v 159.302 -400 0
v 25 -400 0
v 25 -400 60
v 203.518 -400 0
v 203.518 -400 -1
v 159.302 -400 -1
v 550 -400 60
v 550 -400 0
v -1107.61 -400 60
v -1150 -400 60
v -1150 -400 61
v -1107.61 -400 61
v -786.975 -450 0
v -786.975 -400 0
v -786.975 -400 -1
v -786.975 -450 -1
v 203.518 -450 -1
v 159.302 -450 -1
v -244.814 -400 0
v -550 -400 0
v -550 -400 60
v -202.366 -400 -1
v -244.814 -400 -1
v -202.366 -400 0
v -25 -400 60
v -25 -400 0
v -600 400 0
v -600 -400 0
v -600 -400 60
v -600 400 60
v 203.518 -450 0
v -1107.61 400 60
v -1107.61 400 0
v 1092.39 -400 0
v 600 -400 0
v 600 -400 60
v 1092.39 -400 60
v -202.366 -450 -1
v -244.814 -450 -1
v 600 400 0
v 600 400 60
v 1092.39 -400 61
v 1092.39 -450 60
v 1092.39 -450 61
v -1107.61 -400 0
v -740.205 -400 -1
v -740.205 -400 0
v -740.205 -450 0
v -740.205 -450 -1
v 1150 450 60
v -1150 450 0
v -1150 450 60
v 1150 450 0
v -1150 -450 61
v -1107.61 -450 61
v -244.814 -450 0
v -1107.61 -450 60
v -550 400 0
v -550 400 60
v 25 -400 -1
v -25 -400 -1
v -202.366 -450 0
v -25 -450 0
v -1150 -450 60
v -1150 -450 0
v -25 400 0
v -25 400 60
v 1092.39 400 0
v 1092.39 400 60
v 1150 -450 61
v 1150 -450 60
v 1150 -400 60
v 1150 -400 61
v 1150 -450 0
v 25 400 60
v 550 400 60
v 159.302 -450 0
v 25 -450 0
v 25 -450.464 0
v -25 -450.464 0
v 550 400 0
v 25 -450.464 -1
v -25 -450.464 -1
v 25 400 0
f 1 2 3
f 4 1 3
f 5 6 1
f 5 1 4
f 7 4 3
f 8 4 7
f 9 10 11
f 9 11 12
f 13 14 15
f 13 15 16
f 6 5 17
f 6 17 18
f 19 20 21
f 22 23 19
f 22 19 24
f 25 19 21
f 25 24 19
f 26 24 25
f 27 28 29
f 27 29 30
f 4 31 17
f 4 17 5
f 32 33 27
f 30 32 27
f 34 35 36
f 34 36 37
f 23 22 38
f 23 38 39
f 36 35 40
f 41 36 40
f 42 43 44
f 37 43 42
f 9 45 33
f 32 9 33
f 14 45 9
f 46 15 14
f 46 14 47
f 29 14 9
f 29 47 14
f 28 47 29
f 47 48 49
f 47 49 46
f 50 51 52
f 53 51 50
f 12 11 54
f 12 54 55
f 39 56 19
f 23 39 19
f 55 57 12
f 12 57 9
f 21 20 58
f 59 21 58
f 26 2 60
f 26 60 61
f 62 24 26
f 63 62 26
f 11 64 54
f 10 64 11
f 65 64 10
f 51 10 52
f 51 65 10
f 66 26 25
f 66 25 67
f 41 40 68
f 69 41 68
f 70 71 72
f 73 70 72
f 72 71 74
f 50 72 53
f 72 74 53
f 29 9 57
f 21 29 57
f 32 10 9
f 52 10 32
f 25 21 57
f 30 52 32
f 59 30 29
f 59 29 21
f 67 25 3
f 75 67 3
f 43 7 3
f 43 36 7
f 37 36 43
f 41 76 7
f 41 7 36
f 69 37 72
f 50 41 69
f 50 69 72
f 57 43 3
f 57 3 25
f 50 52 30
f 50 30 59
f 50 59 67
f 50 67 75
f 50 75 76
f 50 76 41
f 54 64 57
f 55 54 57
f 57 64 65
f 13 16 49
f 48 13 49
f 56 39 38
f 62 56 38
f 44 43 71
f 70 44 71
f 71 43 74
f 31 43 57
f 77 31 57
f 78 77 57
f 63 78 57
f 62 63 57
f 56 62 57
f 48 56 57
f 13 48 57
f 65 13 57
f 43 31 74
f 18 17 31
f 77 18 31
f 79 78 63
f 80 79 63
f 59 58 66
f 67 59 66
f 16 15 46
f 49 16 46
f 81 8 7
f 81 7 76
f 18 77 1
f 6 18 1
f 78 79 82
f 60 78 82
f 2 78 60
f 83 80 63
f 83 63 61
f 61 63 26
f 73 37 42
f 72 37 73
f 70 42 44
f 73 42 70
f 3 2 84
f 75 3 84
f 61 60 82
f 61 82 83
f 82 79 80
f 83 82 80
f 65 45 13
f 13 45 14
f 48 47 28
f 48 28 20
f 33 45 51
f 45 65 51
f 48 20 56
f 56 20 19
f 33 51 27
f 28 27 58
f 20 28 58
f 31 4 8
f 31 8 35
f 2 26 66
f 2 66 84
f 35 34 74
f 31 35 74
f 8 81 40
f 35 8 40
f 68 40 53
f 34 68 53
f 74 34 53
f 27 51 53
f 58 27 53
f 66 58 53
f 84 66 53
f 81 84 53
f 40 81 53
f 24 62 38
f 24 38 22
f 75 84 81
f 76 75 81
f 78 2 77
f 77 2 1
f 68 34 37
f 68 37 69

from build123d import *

# Parameters (mm, degrees)
SKETCH1_W           = 2300
SKETCH1_H           = 900
SKETCH1_W_2         = 525
SKETCH1_H_2         = 800
SKETCH1_W_3         = 492.389580631
SKETCH1_W_4         = 507.610419369
BOSS_EXTRUDE1_DEPTH = 60
SKETCH2_W           = 42.389580631
SKETCH2_H           = 50
SKETCH2_W_2         = 57.610419369
BOSS_EXTRUDE2_DEPTH = 1
SKETCH4_W           = 50
SKETCH4_H           = 50.463593603
BOSS_EXTRUDE4_DEPTH = 1
SKETCH5_W           = 44.216514846
SKETCH5_H           = 50
BOSS_EXTRUDE5_DEPTH = 1
SKETCH6_W           = 42.447812038
SKETCH6_H           = 50
BOSS_EXTRUDE6_DEPTH = 1
BOSS_EXTRUDE7_DEPTH = 1


with BuildPart() as part:
    # Sketch1 → Boss-Extrude1 (new body)
    with BuildSketch(Plane.XY):
        Rectangle(SKETCH1_W, SKETCH1_H)
        with Locations((-287.5, 0)):
            Rectangle(SKETCH1_W_2, SKETCH1_H_2, mode=Mode.SUBTRACT)
        with Locations((287.5, 0)):
            Rectangle(SKETCH1_W_2, SKETCH1_H_2, mode=Mode.SUBTRACT)
        with Locations((846.194790316, 0)):
            Rectangle(SKETCH1_W_3, SKETCH1_H_2, mode=Mode.SUBTRACT)
        with Locations((-853.805209685, 0)):
            Rectangle(SKETCH1_W_4, SKETCH1_H_2, mode=Mode.SUBTRACT)
    extrude(amount=BOSS_EXTRUDE1_DEPTH)

    # Sketch2 → Boss-Extrude2 (add)
    with BuildSketch(Plane.XY.offset(60)):
        with Locations((-1128.805209684, -425)):
            Rectangle(SKETCH2_W, SKETCH2_H)
        with Locations((1121.194790316, -425)):
            Rectangle(SKETCH2_W_2, SKETCH2_H)
    extrude(amount=BOSS_EXTRUDE2_DEPTH)

    # Sketch4 → Boss-Extrude4 (add)
    with BuildSketch(Plane(origin=(0, 0, 0), x_dir=(-1, 0, 0), z_dir=(0, 0, -1))):
        with Locations((0, -425.231796802)):
            Rectangle(SKETCH4_W, SKETCH4_H)
    extrude(amount=BOSS_EXTRUDE4_DEPTH)

    # Sketch5 → Boss-Extrude5 (add)
    with BuildSketch(Plane(origin=(0, 0, 0), x_dir=(-1, 0, 0), z_dir=(0, 0, -1))):
        with Locations((-181.41, -425)):
            Rectangle(SKETCH5_W, SKETCH5_H)
    extrude(amount=BOSS_EXTRUDE5_DEPTH)

    # Sketch6 → Boss-Extrude6 (add)
    with BuildSketch(Plane(origin=(0, 0, 0), x_dir=(-1, 0, 0), z_dir=(0, 0, -1))):
        with Locations((223.59, -425)):
            Rectangle(SKETCH6_W, SKETCH6_H)
    extrude(amount=BOSS_EXTRUDE6_DEPTH)

    # Sketch7 → Boss-Extrude7 (add)
    with BuildSketch(Plane(origin=(0, 0, 0), x_dir=(-1, 0, 0), z_dir=(0, 0, -1))):
        Polygon((740.20473979, -400), (763.59, -400), (786.97526021, -400), (786.97526021, -450), (763.59, -450), (740.20473979, -450), align=None)
    extrude(amount=BOSS_EXTRUDE7_DEPTH)


solid = part.part
